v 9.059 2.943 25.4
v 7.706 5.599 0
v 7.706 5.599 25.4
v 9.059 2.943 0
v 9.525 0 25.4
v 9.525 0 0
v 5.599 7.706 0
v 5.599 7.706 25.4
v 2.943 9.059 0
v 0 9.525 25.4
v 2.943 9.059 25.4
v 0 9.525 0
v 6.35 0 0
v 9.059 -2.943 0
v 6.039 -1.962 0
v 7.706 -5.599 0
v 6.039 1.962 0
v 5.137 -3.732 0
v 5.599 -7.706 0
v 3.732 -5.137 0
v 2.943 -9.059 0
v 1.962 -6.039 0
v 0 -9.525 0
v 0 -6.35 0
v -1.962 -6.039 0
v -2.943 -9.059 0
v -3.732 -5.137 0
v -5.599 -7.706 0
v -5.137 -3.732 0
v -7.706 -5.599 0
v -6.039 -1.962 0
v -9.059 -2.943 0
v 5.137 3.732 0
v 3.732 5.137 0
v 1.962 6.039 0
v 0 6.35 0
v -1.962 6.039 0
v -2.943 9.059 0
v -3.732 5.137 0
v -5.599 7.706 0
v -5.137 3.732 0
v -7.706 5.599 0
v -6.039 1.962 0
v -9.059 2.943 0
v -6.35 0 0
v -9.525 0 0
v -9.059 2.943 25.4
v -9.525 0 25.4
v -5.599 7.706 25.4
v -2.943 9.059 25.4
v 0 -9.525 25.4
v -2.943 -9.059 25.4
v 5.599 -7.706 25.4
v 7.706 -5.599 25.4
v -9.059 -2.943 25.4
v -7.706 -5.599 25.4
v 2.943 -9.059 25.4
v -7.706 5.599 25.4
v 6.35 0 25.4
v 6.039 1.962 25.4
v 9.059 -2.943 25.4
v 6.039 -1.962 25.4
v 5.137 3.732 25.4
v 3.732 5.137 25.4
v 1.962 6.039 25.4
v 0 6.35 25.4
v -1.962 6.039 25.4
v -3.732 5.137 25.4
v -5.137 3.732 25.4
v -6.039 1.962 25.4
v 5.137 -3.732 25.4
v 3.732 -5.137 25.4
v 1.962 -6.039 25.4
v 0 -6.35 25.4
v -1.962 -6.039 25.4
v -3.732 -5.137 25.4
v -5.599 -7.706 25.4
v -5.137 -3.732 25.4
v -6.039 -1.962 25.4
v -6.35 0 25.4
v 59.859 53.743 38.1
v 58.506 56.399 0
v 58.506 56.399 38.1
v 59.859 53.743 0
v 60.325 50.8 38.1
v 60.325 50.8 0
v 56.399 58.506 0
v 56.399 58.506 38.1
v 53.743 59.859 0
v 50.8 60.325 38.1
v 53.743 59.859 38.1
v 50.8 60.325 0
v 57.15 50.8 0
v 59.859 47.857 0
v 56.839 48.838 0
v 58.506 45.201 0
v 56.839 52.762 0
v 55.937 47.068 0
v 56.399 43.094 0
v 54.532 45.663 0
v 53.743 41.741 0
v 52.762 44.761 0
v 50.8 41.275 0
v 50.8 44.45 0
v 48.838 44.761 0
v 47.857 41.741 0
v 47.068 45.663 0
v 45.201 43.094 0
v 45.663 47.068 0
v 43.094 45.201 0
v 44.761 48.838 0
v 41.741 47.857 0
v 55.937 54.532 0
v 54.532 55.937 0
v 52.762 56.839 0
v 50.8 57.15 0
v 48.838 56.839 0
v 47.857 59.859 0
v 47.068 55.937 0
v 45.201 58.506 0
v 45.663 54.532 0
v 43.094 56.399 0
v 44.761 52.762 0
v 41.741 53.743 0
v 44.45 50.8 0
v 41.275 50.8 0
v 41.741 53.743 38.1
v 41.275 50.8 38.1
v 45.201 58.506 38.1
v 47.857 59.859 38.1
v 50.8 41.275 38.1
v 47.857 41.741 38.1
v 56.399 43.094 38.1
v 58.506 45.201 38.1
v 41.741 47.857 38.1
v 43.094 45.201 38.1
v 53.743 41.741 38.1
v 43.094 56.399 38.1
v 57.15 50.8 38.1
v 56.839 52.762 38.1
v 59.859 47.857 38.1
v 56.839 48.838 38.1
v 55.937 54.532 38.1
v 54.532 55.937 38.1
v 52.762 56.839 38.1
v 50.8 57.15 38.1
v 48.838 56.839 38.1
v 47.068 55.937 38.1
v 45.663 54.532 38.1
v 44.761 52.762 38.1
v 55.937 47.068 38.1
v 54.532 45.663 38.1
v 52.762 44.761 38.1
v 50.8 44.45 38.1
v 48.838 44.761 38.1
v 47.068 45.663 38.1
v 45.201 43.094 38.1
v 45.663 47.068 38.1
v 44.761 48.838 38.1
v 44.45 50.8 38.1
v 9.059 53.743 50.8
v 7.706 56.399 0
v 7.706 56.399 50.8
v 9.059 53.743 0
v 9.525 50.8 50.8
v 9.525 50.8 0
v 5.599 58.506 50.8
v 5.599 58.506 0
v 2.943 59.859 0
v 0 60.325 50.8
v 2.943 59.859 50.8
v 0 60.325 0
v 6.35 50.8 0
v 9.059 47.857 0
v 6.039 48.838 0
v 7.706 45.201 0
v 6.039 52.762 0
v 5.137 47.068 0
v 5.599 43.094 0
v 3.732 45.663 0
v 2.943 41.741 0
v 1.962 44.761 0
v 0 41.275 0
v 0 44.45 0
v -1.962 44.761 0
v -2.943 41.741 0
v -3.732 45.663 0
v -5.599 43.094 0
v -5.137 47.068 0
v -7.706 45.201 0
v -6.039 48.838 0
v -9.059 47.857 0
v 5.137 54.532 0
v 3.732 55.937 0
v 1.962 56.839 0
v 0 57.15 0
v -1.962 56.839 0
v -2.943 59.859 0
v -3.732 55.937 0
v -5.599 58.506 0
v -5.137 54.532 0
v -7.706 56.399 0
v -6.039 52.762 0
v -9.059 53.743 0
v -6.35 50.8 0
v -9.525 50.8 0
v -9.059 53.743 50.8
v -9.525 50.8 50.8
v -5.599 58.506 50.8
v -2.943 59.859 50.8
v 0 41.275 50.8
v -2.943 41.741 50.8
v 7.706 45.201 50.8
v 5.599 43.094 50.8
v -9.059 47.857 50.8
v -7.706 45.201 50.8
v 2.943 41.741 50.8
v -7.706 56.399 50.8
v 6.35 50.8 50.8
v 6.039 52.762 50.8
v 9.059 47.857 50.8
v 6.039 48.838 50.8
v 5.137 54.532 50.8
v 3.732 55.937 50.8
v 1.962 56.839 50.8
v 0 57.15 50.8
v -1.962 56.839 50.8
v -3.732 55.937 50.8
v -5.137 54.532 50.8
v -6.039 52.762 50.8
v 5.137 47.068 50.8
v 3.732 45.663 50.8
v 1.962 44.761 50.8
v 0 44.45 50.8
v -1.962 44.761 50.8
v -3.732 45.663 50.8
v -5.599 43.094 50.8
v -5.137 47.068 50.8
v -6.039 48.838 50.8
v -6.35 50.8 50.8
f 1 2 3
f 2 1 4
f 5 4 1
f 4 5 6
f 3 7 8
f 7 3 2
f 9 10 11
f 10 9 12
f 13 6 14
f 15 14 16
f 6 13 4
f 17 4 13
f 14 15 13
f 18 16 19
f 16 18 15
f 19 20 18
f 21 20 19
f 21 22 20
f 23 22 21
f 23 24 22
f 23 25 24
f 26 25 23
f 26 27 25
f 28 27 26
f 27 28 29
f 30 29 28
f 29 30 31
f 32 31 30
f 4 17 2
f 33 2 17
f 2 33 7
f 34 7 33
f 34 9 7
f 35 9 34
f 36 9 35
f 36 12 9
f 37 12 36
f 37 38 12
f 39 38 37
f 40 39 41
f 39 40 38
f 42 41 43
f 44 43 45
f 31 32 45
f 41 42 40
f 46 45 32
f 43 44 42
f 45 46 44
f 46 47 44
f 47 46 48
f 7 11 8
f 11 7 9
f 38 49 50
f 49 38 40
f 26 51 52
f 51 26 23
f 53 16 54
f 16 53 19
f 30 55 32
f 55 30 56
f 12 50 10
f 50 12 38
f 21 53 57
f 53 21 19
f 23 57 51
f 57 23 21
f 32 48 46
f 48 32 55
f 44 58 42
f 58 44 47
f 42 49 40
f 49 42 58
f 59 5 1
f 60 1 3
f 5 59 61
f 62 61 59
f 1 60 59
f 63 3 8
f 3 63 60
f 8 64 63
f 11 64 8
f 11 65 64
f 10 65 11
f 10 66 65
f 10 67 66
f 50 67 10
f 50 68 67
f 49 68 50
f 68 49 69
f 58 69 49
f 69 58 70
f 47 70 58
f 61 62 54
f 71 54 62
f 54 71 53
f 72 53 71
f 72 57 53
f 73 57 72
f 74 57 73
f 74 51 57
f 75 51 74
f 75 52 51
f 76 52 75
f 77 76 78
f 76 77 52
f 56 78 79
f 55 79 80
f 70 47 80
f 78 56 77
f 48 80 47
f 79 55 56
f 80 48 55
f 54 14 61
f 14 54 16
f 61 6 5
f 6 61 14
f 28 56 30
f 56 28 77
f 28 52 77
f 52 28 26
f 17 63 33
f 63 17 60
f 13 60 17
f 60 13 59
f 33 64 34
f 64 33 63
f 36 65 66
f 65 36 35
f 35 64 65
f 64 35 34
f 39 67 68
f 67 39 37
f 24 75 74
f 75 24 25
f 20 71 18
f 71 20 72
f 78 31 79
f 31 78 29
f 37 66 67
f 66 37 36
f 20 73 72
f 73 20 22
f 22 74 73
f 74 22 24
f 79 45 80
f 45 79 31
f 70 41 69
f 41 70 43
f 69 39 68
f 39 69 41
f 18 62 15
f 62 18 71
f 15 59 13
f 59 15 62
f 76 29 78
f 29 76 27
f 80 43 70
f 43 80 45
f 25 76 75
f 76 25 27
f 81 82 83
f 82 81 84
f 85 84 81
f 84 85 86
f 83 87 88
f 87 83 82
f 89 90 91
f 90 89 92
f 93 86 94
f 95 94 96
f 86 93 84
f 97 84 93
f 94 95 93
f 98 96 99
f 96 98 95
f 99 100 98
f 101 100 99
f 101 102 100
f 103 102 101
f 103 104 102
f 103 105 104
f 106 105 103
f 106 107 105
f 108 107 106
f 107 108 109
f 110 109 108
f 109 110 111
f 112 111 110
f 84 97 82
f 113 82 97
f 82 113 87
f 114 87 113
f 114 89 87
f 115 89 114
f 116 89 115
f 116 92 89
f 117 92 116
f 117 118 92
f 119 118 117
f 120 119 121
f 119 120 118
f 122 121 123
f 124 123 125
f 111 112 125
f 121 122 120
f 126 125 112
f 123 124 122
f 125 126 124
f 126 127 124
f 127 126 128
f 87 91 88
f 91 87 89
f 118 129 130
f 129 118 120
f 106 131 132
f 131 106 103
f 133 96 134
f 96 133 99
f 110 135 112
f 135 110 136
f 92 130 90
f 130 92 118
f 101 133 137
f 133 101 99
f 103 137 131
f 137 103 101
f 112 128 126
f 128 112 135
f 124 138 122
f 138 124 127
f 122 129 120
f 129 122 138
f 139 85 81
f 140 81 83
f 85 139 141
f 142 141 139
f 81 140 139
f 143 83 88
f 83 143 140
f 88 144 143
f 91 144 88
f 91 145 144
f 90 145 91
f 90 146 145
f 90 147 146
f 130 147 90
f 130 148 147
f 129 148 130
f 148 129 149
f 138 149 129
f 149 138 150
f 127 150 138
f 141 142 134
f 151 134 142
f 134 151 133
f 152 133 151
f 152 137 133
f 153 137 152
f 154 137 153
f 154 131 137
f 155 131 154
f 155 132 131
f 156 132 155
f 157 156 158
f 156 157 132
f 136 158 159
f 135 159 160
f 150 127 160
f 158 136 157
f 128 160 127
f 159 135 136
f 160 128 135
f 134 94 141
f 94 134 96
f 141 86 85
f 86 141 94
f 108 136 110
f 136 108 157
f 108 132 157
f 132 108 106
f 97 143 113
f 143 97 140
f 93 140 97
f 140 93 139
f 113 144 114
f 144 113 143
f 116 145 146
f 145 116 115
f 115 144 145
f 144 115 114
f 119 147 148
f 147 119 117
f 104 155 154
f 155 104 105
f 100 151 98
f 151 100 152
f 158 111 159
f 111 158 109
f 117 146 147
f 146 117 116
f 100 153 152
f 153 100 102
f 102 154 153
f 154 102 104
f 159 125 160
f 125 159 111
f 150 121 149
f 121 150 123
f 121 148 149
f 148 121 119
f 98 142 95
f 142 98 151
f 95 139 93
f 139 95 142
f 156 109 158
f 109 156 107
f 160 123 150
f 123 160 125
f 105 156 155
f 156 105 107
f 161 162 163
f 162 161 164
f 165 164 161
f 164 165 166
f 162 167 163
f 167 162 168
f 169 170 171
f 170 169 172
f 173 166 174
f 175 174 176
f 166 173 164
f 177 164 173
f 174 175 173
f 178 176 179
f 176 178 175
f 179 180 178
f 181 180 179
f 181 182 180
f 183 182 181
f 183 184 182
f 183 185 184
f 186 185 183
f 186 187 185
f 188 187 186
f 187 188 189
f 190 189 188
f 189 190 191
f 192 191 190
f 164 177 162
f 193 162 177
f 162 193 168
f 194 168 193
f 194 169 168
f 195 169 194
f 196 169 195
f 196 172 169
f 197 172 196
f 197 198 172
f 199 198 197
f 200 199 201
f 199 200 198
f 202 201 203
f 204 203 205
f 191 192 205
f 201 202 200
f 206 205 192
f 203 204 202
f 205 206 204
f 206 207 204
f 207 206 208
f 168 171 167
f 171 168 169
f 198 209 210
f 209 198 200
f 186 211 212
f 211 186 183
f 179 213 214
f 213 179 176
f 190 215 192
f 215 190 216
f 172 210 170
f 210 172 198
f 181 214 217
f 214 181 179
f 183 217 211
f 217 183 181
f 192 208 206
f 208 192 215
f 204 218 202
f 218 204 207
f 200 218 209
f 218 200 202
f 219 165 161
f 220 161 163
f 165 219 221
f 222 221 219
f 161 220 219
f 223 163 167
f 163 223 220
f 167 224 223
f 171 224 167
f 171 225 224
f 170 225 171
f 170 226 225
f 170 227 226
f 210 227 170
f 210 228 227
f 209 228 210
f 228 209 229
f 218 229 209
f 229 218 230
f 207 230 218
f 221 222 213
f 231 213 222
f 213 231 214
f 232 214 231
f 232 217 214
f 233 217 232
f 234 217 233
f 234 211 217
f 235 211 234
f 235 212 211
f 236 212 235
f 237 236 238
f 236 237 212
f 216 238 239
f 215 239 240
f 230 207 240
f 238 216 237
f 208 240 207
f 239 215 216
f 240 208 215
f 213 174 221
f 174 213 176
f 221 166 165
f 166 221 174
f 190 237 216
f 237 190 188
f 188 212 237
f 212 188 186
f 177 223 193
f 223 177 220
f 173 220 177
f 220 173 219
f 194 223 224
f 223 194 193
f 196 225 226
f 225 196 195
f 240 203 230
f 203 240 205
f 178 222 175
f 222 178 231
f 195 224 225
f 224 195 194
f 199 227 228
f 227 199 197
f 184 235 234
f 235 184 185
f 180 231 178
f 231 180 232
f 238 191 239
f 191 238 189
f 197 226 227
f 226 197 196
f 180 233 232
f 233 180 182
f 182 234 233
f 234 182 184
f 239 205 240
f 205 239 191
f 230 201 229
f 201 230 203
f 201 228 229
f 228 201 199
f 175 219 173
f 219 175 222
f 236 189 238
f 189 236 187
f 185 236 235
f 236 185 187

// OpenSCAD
module stock_spacer(length=1, od=0.75, id=0.5, $fn=20) {
  difference() {
    cylinder(r=od/2, h=length);

    translate([0,0,-0.1])
    cylinder(r=id/2, h=length+0.2);
  }
}




/*
 * Stock spacers are stackable, print in whatever size is needed.
 *
 * E = Depth of the stock, from the front of the extension pipe to the rope guide.
 * 
 * T = Depth of the receiver tee, from the back of the breech bushing to the rear tee rim.
 *
 * S = Length of the striker stack (excluding the firing pin): body-washers-cap-spring-cap
 *
 * StockSpacing = E + T - S
 *
 * Example: 12.5in + 1.128in - 8.2in = 5.43in of spacing
 *
 */
scale([25.4, 25.4, 25.4]) {
  stock_spacer(length=1);
  translate([2,2,0])
  stock_spacer(length=1.5);
  translate([0,2,0])
  stock_spacer(length=2);
}
